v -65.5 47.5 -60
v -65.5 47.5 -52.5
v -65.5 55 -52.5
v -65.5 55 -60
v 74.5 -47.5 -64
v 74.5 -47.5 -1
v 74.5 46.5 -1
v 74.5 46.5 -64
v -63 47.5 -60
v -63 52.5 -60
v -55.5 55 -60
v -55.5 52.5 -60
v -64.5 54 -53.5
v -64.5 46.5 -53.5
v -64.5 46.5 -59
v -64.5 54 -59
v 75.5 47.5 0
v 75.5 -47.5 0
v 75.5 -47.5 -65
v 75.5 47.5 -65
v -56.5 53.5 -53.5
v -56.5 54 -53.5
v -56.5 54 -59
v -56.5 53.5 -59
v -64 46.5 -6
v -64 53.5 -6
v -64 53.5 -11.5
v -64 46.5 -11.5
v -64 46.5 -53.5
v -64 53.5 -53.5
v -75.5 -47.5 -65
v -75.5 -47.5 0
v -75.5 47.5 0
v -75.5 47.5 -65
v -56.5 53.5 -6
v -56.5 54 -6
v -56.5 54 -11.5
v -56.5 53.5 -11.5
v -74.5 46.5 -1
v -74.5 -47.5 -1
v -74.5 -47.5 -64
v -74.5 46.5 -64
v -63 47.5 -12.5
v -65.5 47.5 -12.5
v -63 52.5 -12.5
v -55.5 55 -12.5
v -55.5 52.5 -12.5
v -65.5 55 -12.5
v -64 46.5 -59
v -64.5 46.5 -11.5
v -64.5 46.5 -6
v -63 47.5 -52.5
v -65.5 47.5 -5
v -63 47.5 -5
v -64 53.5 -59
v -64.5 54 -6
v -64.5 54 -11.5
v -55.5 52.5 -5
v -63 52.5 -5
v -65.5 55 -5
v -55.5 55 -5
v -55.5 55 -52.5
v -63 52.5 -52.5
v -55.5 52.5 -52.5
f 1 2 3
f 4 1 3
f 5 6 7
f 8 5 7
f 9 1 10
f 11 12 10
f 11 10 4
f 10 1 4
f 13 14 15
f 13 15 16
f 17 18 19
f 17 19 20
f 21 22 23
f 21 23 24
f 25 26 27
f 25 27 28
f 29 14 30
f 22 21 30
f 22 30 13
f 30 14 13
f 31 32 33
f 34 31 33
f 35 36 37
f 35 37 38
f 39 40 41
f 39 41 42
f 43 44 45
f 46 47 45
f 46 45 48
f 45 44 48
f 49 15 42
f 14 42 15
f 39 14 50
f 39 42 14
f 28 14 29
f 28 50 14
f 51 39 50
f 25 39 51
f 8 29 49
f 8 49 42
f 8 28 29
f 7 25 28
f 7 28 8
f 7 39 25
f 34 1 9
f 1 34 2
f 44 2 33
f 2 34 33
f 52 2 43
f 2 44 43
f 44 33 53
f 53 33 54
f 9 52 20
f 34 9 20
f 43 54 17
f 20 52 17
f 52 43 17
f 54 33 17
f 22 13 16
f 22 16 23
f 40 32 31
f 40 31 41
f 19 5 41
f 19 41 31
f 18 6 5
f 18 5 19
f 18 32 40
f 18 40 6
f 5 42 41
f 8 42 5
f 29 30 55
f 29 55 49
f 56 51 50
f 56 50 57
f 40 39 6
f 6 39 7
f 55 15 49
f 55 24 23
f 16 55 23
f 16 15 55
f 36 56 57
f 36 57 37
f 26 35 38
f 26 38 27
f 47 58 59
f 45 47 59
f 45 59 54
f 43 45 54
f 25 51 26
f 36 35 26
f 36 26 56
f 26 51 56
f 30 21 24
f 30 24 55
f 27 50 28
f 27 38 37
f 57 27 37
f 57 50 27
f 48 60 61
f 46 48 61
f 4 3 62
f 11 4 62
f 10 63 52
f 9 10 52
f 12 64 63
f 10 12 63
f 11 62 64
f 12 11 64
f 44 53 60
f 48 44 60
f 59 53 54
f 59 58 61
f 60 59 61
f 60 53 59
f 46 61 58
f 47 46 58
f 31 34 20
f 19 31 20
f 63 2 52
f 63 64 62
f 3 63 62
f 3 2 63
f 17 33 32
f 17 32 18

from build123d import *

# Parameters (mm, degrees)
SKETCH1_W           = 151
SKETCH1_H           = 95
BOSS_EXTRUDE1_DEPTH = 65
BOSS_EXTRUDE2_DEPTH = 65
CUT_EXTRUDE1_REACH  = 143
SKETCH3_W           = 5
SKETCH3_H           = 7.5
SKETCH3_W_2         = 40
SHELL1_T            = -1


with BuildPart() as part:
    # Sketch1 → Boss-Extrude1 (new body)
    with BuildSketch(Plane.XY):
        Rectangle(SKETCH1_W, SKETCH1_H)
    extrude(amount=-BOSS_EXTRUDE1_DEPTH)

    # Sketch2 → Boss-Extrude2 (add)
    with BuildSketch(Plane.XY):
        Polygon((-65.5, 47.5), (-65.5, 55), (-55.5, 55), (-55.5, 52.5), (-63, 52.5), (-63, 47.5), align=None)
    extrude(amount=-BOSS_EXTRUDE2_DEPTH)

    # Sketch3 → Cut-Extrude1 (cut, up to next)
    with BuildSketch(Plane.ZY.offset(65.5), mode=Mode.PRIVATE) as cut_extrude1_sk1:
        with Locations((-62.5, 51.25)):
            Rectangle(SKETCH3_W, SKETCH3_H)
    cut_extrude1_tool1 = extrude(cut_extrude1_sk1.sketch, amount=-CUT_EXTRUDE1_REACH, mode=Mode.PRIVATE) & part.part
    add(cut_extrude1_tool1.solids().sort_by_distance((-65.5, 51.25, -62.5))[0], mode=Mode.SUBTRACT)
    # Sketch3 → Cut-Extrude1 (cut, up to next)
    with BuildSketch(Plane.ZY.offset(65.5), mode=Mode.PRIVATE) as cut_extrude1_sk2:
        with Locations((-32.5, 51.25)):
            Rectangle(SKETCH3_W_2, SKETCH3_H)
    cut_extrude1_tool2 = extrude(cut_extrude1_sk2.sketch, amount=-CUT_EXTRUDE1_REACH, mode=Mode.PRIVATE) & part.part
    add(cut_extrude1_tool2.solids().sort_by_distance((-65.5, 51.25, -32.5))[0], mode=Mode.SUBTRACT)
    # Sketch3 → Cut-Extrude1 (cut, up to next)
    with BuildSketch(Plane.ZY.offset(65.5), mode=Mode.PRIVATE) as cut_extrude1_sk3:
        with Locations((-2.5, 51.25)):
            Rectangle(SKETCH3_W, SKETCH3_H)
    cut_extrude1_tool3 = extrude(cut_extrude1_sk3.sketch, amount=-CUT_EXTRUDE1_REACH, mode=Mode.PRIVATE) & part.part
    add(cut_extrude1_tool3.solids().sort_by_distance((-65.5, 51.25, -2.5))[0], mode=Mode.SUBTRACT)

    # Shell1
    shell1_openings = [part.faces().sort_by_distance(p)[0] for p in [
        (0, -47.5, -32.5),
    ]]
    offset(amount=SHELL1_T, openings=shell1_openings, kind=Kind.INTERSECTION)


solid = part.part
